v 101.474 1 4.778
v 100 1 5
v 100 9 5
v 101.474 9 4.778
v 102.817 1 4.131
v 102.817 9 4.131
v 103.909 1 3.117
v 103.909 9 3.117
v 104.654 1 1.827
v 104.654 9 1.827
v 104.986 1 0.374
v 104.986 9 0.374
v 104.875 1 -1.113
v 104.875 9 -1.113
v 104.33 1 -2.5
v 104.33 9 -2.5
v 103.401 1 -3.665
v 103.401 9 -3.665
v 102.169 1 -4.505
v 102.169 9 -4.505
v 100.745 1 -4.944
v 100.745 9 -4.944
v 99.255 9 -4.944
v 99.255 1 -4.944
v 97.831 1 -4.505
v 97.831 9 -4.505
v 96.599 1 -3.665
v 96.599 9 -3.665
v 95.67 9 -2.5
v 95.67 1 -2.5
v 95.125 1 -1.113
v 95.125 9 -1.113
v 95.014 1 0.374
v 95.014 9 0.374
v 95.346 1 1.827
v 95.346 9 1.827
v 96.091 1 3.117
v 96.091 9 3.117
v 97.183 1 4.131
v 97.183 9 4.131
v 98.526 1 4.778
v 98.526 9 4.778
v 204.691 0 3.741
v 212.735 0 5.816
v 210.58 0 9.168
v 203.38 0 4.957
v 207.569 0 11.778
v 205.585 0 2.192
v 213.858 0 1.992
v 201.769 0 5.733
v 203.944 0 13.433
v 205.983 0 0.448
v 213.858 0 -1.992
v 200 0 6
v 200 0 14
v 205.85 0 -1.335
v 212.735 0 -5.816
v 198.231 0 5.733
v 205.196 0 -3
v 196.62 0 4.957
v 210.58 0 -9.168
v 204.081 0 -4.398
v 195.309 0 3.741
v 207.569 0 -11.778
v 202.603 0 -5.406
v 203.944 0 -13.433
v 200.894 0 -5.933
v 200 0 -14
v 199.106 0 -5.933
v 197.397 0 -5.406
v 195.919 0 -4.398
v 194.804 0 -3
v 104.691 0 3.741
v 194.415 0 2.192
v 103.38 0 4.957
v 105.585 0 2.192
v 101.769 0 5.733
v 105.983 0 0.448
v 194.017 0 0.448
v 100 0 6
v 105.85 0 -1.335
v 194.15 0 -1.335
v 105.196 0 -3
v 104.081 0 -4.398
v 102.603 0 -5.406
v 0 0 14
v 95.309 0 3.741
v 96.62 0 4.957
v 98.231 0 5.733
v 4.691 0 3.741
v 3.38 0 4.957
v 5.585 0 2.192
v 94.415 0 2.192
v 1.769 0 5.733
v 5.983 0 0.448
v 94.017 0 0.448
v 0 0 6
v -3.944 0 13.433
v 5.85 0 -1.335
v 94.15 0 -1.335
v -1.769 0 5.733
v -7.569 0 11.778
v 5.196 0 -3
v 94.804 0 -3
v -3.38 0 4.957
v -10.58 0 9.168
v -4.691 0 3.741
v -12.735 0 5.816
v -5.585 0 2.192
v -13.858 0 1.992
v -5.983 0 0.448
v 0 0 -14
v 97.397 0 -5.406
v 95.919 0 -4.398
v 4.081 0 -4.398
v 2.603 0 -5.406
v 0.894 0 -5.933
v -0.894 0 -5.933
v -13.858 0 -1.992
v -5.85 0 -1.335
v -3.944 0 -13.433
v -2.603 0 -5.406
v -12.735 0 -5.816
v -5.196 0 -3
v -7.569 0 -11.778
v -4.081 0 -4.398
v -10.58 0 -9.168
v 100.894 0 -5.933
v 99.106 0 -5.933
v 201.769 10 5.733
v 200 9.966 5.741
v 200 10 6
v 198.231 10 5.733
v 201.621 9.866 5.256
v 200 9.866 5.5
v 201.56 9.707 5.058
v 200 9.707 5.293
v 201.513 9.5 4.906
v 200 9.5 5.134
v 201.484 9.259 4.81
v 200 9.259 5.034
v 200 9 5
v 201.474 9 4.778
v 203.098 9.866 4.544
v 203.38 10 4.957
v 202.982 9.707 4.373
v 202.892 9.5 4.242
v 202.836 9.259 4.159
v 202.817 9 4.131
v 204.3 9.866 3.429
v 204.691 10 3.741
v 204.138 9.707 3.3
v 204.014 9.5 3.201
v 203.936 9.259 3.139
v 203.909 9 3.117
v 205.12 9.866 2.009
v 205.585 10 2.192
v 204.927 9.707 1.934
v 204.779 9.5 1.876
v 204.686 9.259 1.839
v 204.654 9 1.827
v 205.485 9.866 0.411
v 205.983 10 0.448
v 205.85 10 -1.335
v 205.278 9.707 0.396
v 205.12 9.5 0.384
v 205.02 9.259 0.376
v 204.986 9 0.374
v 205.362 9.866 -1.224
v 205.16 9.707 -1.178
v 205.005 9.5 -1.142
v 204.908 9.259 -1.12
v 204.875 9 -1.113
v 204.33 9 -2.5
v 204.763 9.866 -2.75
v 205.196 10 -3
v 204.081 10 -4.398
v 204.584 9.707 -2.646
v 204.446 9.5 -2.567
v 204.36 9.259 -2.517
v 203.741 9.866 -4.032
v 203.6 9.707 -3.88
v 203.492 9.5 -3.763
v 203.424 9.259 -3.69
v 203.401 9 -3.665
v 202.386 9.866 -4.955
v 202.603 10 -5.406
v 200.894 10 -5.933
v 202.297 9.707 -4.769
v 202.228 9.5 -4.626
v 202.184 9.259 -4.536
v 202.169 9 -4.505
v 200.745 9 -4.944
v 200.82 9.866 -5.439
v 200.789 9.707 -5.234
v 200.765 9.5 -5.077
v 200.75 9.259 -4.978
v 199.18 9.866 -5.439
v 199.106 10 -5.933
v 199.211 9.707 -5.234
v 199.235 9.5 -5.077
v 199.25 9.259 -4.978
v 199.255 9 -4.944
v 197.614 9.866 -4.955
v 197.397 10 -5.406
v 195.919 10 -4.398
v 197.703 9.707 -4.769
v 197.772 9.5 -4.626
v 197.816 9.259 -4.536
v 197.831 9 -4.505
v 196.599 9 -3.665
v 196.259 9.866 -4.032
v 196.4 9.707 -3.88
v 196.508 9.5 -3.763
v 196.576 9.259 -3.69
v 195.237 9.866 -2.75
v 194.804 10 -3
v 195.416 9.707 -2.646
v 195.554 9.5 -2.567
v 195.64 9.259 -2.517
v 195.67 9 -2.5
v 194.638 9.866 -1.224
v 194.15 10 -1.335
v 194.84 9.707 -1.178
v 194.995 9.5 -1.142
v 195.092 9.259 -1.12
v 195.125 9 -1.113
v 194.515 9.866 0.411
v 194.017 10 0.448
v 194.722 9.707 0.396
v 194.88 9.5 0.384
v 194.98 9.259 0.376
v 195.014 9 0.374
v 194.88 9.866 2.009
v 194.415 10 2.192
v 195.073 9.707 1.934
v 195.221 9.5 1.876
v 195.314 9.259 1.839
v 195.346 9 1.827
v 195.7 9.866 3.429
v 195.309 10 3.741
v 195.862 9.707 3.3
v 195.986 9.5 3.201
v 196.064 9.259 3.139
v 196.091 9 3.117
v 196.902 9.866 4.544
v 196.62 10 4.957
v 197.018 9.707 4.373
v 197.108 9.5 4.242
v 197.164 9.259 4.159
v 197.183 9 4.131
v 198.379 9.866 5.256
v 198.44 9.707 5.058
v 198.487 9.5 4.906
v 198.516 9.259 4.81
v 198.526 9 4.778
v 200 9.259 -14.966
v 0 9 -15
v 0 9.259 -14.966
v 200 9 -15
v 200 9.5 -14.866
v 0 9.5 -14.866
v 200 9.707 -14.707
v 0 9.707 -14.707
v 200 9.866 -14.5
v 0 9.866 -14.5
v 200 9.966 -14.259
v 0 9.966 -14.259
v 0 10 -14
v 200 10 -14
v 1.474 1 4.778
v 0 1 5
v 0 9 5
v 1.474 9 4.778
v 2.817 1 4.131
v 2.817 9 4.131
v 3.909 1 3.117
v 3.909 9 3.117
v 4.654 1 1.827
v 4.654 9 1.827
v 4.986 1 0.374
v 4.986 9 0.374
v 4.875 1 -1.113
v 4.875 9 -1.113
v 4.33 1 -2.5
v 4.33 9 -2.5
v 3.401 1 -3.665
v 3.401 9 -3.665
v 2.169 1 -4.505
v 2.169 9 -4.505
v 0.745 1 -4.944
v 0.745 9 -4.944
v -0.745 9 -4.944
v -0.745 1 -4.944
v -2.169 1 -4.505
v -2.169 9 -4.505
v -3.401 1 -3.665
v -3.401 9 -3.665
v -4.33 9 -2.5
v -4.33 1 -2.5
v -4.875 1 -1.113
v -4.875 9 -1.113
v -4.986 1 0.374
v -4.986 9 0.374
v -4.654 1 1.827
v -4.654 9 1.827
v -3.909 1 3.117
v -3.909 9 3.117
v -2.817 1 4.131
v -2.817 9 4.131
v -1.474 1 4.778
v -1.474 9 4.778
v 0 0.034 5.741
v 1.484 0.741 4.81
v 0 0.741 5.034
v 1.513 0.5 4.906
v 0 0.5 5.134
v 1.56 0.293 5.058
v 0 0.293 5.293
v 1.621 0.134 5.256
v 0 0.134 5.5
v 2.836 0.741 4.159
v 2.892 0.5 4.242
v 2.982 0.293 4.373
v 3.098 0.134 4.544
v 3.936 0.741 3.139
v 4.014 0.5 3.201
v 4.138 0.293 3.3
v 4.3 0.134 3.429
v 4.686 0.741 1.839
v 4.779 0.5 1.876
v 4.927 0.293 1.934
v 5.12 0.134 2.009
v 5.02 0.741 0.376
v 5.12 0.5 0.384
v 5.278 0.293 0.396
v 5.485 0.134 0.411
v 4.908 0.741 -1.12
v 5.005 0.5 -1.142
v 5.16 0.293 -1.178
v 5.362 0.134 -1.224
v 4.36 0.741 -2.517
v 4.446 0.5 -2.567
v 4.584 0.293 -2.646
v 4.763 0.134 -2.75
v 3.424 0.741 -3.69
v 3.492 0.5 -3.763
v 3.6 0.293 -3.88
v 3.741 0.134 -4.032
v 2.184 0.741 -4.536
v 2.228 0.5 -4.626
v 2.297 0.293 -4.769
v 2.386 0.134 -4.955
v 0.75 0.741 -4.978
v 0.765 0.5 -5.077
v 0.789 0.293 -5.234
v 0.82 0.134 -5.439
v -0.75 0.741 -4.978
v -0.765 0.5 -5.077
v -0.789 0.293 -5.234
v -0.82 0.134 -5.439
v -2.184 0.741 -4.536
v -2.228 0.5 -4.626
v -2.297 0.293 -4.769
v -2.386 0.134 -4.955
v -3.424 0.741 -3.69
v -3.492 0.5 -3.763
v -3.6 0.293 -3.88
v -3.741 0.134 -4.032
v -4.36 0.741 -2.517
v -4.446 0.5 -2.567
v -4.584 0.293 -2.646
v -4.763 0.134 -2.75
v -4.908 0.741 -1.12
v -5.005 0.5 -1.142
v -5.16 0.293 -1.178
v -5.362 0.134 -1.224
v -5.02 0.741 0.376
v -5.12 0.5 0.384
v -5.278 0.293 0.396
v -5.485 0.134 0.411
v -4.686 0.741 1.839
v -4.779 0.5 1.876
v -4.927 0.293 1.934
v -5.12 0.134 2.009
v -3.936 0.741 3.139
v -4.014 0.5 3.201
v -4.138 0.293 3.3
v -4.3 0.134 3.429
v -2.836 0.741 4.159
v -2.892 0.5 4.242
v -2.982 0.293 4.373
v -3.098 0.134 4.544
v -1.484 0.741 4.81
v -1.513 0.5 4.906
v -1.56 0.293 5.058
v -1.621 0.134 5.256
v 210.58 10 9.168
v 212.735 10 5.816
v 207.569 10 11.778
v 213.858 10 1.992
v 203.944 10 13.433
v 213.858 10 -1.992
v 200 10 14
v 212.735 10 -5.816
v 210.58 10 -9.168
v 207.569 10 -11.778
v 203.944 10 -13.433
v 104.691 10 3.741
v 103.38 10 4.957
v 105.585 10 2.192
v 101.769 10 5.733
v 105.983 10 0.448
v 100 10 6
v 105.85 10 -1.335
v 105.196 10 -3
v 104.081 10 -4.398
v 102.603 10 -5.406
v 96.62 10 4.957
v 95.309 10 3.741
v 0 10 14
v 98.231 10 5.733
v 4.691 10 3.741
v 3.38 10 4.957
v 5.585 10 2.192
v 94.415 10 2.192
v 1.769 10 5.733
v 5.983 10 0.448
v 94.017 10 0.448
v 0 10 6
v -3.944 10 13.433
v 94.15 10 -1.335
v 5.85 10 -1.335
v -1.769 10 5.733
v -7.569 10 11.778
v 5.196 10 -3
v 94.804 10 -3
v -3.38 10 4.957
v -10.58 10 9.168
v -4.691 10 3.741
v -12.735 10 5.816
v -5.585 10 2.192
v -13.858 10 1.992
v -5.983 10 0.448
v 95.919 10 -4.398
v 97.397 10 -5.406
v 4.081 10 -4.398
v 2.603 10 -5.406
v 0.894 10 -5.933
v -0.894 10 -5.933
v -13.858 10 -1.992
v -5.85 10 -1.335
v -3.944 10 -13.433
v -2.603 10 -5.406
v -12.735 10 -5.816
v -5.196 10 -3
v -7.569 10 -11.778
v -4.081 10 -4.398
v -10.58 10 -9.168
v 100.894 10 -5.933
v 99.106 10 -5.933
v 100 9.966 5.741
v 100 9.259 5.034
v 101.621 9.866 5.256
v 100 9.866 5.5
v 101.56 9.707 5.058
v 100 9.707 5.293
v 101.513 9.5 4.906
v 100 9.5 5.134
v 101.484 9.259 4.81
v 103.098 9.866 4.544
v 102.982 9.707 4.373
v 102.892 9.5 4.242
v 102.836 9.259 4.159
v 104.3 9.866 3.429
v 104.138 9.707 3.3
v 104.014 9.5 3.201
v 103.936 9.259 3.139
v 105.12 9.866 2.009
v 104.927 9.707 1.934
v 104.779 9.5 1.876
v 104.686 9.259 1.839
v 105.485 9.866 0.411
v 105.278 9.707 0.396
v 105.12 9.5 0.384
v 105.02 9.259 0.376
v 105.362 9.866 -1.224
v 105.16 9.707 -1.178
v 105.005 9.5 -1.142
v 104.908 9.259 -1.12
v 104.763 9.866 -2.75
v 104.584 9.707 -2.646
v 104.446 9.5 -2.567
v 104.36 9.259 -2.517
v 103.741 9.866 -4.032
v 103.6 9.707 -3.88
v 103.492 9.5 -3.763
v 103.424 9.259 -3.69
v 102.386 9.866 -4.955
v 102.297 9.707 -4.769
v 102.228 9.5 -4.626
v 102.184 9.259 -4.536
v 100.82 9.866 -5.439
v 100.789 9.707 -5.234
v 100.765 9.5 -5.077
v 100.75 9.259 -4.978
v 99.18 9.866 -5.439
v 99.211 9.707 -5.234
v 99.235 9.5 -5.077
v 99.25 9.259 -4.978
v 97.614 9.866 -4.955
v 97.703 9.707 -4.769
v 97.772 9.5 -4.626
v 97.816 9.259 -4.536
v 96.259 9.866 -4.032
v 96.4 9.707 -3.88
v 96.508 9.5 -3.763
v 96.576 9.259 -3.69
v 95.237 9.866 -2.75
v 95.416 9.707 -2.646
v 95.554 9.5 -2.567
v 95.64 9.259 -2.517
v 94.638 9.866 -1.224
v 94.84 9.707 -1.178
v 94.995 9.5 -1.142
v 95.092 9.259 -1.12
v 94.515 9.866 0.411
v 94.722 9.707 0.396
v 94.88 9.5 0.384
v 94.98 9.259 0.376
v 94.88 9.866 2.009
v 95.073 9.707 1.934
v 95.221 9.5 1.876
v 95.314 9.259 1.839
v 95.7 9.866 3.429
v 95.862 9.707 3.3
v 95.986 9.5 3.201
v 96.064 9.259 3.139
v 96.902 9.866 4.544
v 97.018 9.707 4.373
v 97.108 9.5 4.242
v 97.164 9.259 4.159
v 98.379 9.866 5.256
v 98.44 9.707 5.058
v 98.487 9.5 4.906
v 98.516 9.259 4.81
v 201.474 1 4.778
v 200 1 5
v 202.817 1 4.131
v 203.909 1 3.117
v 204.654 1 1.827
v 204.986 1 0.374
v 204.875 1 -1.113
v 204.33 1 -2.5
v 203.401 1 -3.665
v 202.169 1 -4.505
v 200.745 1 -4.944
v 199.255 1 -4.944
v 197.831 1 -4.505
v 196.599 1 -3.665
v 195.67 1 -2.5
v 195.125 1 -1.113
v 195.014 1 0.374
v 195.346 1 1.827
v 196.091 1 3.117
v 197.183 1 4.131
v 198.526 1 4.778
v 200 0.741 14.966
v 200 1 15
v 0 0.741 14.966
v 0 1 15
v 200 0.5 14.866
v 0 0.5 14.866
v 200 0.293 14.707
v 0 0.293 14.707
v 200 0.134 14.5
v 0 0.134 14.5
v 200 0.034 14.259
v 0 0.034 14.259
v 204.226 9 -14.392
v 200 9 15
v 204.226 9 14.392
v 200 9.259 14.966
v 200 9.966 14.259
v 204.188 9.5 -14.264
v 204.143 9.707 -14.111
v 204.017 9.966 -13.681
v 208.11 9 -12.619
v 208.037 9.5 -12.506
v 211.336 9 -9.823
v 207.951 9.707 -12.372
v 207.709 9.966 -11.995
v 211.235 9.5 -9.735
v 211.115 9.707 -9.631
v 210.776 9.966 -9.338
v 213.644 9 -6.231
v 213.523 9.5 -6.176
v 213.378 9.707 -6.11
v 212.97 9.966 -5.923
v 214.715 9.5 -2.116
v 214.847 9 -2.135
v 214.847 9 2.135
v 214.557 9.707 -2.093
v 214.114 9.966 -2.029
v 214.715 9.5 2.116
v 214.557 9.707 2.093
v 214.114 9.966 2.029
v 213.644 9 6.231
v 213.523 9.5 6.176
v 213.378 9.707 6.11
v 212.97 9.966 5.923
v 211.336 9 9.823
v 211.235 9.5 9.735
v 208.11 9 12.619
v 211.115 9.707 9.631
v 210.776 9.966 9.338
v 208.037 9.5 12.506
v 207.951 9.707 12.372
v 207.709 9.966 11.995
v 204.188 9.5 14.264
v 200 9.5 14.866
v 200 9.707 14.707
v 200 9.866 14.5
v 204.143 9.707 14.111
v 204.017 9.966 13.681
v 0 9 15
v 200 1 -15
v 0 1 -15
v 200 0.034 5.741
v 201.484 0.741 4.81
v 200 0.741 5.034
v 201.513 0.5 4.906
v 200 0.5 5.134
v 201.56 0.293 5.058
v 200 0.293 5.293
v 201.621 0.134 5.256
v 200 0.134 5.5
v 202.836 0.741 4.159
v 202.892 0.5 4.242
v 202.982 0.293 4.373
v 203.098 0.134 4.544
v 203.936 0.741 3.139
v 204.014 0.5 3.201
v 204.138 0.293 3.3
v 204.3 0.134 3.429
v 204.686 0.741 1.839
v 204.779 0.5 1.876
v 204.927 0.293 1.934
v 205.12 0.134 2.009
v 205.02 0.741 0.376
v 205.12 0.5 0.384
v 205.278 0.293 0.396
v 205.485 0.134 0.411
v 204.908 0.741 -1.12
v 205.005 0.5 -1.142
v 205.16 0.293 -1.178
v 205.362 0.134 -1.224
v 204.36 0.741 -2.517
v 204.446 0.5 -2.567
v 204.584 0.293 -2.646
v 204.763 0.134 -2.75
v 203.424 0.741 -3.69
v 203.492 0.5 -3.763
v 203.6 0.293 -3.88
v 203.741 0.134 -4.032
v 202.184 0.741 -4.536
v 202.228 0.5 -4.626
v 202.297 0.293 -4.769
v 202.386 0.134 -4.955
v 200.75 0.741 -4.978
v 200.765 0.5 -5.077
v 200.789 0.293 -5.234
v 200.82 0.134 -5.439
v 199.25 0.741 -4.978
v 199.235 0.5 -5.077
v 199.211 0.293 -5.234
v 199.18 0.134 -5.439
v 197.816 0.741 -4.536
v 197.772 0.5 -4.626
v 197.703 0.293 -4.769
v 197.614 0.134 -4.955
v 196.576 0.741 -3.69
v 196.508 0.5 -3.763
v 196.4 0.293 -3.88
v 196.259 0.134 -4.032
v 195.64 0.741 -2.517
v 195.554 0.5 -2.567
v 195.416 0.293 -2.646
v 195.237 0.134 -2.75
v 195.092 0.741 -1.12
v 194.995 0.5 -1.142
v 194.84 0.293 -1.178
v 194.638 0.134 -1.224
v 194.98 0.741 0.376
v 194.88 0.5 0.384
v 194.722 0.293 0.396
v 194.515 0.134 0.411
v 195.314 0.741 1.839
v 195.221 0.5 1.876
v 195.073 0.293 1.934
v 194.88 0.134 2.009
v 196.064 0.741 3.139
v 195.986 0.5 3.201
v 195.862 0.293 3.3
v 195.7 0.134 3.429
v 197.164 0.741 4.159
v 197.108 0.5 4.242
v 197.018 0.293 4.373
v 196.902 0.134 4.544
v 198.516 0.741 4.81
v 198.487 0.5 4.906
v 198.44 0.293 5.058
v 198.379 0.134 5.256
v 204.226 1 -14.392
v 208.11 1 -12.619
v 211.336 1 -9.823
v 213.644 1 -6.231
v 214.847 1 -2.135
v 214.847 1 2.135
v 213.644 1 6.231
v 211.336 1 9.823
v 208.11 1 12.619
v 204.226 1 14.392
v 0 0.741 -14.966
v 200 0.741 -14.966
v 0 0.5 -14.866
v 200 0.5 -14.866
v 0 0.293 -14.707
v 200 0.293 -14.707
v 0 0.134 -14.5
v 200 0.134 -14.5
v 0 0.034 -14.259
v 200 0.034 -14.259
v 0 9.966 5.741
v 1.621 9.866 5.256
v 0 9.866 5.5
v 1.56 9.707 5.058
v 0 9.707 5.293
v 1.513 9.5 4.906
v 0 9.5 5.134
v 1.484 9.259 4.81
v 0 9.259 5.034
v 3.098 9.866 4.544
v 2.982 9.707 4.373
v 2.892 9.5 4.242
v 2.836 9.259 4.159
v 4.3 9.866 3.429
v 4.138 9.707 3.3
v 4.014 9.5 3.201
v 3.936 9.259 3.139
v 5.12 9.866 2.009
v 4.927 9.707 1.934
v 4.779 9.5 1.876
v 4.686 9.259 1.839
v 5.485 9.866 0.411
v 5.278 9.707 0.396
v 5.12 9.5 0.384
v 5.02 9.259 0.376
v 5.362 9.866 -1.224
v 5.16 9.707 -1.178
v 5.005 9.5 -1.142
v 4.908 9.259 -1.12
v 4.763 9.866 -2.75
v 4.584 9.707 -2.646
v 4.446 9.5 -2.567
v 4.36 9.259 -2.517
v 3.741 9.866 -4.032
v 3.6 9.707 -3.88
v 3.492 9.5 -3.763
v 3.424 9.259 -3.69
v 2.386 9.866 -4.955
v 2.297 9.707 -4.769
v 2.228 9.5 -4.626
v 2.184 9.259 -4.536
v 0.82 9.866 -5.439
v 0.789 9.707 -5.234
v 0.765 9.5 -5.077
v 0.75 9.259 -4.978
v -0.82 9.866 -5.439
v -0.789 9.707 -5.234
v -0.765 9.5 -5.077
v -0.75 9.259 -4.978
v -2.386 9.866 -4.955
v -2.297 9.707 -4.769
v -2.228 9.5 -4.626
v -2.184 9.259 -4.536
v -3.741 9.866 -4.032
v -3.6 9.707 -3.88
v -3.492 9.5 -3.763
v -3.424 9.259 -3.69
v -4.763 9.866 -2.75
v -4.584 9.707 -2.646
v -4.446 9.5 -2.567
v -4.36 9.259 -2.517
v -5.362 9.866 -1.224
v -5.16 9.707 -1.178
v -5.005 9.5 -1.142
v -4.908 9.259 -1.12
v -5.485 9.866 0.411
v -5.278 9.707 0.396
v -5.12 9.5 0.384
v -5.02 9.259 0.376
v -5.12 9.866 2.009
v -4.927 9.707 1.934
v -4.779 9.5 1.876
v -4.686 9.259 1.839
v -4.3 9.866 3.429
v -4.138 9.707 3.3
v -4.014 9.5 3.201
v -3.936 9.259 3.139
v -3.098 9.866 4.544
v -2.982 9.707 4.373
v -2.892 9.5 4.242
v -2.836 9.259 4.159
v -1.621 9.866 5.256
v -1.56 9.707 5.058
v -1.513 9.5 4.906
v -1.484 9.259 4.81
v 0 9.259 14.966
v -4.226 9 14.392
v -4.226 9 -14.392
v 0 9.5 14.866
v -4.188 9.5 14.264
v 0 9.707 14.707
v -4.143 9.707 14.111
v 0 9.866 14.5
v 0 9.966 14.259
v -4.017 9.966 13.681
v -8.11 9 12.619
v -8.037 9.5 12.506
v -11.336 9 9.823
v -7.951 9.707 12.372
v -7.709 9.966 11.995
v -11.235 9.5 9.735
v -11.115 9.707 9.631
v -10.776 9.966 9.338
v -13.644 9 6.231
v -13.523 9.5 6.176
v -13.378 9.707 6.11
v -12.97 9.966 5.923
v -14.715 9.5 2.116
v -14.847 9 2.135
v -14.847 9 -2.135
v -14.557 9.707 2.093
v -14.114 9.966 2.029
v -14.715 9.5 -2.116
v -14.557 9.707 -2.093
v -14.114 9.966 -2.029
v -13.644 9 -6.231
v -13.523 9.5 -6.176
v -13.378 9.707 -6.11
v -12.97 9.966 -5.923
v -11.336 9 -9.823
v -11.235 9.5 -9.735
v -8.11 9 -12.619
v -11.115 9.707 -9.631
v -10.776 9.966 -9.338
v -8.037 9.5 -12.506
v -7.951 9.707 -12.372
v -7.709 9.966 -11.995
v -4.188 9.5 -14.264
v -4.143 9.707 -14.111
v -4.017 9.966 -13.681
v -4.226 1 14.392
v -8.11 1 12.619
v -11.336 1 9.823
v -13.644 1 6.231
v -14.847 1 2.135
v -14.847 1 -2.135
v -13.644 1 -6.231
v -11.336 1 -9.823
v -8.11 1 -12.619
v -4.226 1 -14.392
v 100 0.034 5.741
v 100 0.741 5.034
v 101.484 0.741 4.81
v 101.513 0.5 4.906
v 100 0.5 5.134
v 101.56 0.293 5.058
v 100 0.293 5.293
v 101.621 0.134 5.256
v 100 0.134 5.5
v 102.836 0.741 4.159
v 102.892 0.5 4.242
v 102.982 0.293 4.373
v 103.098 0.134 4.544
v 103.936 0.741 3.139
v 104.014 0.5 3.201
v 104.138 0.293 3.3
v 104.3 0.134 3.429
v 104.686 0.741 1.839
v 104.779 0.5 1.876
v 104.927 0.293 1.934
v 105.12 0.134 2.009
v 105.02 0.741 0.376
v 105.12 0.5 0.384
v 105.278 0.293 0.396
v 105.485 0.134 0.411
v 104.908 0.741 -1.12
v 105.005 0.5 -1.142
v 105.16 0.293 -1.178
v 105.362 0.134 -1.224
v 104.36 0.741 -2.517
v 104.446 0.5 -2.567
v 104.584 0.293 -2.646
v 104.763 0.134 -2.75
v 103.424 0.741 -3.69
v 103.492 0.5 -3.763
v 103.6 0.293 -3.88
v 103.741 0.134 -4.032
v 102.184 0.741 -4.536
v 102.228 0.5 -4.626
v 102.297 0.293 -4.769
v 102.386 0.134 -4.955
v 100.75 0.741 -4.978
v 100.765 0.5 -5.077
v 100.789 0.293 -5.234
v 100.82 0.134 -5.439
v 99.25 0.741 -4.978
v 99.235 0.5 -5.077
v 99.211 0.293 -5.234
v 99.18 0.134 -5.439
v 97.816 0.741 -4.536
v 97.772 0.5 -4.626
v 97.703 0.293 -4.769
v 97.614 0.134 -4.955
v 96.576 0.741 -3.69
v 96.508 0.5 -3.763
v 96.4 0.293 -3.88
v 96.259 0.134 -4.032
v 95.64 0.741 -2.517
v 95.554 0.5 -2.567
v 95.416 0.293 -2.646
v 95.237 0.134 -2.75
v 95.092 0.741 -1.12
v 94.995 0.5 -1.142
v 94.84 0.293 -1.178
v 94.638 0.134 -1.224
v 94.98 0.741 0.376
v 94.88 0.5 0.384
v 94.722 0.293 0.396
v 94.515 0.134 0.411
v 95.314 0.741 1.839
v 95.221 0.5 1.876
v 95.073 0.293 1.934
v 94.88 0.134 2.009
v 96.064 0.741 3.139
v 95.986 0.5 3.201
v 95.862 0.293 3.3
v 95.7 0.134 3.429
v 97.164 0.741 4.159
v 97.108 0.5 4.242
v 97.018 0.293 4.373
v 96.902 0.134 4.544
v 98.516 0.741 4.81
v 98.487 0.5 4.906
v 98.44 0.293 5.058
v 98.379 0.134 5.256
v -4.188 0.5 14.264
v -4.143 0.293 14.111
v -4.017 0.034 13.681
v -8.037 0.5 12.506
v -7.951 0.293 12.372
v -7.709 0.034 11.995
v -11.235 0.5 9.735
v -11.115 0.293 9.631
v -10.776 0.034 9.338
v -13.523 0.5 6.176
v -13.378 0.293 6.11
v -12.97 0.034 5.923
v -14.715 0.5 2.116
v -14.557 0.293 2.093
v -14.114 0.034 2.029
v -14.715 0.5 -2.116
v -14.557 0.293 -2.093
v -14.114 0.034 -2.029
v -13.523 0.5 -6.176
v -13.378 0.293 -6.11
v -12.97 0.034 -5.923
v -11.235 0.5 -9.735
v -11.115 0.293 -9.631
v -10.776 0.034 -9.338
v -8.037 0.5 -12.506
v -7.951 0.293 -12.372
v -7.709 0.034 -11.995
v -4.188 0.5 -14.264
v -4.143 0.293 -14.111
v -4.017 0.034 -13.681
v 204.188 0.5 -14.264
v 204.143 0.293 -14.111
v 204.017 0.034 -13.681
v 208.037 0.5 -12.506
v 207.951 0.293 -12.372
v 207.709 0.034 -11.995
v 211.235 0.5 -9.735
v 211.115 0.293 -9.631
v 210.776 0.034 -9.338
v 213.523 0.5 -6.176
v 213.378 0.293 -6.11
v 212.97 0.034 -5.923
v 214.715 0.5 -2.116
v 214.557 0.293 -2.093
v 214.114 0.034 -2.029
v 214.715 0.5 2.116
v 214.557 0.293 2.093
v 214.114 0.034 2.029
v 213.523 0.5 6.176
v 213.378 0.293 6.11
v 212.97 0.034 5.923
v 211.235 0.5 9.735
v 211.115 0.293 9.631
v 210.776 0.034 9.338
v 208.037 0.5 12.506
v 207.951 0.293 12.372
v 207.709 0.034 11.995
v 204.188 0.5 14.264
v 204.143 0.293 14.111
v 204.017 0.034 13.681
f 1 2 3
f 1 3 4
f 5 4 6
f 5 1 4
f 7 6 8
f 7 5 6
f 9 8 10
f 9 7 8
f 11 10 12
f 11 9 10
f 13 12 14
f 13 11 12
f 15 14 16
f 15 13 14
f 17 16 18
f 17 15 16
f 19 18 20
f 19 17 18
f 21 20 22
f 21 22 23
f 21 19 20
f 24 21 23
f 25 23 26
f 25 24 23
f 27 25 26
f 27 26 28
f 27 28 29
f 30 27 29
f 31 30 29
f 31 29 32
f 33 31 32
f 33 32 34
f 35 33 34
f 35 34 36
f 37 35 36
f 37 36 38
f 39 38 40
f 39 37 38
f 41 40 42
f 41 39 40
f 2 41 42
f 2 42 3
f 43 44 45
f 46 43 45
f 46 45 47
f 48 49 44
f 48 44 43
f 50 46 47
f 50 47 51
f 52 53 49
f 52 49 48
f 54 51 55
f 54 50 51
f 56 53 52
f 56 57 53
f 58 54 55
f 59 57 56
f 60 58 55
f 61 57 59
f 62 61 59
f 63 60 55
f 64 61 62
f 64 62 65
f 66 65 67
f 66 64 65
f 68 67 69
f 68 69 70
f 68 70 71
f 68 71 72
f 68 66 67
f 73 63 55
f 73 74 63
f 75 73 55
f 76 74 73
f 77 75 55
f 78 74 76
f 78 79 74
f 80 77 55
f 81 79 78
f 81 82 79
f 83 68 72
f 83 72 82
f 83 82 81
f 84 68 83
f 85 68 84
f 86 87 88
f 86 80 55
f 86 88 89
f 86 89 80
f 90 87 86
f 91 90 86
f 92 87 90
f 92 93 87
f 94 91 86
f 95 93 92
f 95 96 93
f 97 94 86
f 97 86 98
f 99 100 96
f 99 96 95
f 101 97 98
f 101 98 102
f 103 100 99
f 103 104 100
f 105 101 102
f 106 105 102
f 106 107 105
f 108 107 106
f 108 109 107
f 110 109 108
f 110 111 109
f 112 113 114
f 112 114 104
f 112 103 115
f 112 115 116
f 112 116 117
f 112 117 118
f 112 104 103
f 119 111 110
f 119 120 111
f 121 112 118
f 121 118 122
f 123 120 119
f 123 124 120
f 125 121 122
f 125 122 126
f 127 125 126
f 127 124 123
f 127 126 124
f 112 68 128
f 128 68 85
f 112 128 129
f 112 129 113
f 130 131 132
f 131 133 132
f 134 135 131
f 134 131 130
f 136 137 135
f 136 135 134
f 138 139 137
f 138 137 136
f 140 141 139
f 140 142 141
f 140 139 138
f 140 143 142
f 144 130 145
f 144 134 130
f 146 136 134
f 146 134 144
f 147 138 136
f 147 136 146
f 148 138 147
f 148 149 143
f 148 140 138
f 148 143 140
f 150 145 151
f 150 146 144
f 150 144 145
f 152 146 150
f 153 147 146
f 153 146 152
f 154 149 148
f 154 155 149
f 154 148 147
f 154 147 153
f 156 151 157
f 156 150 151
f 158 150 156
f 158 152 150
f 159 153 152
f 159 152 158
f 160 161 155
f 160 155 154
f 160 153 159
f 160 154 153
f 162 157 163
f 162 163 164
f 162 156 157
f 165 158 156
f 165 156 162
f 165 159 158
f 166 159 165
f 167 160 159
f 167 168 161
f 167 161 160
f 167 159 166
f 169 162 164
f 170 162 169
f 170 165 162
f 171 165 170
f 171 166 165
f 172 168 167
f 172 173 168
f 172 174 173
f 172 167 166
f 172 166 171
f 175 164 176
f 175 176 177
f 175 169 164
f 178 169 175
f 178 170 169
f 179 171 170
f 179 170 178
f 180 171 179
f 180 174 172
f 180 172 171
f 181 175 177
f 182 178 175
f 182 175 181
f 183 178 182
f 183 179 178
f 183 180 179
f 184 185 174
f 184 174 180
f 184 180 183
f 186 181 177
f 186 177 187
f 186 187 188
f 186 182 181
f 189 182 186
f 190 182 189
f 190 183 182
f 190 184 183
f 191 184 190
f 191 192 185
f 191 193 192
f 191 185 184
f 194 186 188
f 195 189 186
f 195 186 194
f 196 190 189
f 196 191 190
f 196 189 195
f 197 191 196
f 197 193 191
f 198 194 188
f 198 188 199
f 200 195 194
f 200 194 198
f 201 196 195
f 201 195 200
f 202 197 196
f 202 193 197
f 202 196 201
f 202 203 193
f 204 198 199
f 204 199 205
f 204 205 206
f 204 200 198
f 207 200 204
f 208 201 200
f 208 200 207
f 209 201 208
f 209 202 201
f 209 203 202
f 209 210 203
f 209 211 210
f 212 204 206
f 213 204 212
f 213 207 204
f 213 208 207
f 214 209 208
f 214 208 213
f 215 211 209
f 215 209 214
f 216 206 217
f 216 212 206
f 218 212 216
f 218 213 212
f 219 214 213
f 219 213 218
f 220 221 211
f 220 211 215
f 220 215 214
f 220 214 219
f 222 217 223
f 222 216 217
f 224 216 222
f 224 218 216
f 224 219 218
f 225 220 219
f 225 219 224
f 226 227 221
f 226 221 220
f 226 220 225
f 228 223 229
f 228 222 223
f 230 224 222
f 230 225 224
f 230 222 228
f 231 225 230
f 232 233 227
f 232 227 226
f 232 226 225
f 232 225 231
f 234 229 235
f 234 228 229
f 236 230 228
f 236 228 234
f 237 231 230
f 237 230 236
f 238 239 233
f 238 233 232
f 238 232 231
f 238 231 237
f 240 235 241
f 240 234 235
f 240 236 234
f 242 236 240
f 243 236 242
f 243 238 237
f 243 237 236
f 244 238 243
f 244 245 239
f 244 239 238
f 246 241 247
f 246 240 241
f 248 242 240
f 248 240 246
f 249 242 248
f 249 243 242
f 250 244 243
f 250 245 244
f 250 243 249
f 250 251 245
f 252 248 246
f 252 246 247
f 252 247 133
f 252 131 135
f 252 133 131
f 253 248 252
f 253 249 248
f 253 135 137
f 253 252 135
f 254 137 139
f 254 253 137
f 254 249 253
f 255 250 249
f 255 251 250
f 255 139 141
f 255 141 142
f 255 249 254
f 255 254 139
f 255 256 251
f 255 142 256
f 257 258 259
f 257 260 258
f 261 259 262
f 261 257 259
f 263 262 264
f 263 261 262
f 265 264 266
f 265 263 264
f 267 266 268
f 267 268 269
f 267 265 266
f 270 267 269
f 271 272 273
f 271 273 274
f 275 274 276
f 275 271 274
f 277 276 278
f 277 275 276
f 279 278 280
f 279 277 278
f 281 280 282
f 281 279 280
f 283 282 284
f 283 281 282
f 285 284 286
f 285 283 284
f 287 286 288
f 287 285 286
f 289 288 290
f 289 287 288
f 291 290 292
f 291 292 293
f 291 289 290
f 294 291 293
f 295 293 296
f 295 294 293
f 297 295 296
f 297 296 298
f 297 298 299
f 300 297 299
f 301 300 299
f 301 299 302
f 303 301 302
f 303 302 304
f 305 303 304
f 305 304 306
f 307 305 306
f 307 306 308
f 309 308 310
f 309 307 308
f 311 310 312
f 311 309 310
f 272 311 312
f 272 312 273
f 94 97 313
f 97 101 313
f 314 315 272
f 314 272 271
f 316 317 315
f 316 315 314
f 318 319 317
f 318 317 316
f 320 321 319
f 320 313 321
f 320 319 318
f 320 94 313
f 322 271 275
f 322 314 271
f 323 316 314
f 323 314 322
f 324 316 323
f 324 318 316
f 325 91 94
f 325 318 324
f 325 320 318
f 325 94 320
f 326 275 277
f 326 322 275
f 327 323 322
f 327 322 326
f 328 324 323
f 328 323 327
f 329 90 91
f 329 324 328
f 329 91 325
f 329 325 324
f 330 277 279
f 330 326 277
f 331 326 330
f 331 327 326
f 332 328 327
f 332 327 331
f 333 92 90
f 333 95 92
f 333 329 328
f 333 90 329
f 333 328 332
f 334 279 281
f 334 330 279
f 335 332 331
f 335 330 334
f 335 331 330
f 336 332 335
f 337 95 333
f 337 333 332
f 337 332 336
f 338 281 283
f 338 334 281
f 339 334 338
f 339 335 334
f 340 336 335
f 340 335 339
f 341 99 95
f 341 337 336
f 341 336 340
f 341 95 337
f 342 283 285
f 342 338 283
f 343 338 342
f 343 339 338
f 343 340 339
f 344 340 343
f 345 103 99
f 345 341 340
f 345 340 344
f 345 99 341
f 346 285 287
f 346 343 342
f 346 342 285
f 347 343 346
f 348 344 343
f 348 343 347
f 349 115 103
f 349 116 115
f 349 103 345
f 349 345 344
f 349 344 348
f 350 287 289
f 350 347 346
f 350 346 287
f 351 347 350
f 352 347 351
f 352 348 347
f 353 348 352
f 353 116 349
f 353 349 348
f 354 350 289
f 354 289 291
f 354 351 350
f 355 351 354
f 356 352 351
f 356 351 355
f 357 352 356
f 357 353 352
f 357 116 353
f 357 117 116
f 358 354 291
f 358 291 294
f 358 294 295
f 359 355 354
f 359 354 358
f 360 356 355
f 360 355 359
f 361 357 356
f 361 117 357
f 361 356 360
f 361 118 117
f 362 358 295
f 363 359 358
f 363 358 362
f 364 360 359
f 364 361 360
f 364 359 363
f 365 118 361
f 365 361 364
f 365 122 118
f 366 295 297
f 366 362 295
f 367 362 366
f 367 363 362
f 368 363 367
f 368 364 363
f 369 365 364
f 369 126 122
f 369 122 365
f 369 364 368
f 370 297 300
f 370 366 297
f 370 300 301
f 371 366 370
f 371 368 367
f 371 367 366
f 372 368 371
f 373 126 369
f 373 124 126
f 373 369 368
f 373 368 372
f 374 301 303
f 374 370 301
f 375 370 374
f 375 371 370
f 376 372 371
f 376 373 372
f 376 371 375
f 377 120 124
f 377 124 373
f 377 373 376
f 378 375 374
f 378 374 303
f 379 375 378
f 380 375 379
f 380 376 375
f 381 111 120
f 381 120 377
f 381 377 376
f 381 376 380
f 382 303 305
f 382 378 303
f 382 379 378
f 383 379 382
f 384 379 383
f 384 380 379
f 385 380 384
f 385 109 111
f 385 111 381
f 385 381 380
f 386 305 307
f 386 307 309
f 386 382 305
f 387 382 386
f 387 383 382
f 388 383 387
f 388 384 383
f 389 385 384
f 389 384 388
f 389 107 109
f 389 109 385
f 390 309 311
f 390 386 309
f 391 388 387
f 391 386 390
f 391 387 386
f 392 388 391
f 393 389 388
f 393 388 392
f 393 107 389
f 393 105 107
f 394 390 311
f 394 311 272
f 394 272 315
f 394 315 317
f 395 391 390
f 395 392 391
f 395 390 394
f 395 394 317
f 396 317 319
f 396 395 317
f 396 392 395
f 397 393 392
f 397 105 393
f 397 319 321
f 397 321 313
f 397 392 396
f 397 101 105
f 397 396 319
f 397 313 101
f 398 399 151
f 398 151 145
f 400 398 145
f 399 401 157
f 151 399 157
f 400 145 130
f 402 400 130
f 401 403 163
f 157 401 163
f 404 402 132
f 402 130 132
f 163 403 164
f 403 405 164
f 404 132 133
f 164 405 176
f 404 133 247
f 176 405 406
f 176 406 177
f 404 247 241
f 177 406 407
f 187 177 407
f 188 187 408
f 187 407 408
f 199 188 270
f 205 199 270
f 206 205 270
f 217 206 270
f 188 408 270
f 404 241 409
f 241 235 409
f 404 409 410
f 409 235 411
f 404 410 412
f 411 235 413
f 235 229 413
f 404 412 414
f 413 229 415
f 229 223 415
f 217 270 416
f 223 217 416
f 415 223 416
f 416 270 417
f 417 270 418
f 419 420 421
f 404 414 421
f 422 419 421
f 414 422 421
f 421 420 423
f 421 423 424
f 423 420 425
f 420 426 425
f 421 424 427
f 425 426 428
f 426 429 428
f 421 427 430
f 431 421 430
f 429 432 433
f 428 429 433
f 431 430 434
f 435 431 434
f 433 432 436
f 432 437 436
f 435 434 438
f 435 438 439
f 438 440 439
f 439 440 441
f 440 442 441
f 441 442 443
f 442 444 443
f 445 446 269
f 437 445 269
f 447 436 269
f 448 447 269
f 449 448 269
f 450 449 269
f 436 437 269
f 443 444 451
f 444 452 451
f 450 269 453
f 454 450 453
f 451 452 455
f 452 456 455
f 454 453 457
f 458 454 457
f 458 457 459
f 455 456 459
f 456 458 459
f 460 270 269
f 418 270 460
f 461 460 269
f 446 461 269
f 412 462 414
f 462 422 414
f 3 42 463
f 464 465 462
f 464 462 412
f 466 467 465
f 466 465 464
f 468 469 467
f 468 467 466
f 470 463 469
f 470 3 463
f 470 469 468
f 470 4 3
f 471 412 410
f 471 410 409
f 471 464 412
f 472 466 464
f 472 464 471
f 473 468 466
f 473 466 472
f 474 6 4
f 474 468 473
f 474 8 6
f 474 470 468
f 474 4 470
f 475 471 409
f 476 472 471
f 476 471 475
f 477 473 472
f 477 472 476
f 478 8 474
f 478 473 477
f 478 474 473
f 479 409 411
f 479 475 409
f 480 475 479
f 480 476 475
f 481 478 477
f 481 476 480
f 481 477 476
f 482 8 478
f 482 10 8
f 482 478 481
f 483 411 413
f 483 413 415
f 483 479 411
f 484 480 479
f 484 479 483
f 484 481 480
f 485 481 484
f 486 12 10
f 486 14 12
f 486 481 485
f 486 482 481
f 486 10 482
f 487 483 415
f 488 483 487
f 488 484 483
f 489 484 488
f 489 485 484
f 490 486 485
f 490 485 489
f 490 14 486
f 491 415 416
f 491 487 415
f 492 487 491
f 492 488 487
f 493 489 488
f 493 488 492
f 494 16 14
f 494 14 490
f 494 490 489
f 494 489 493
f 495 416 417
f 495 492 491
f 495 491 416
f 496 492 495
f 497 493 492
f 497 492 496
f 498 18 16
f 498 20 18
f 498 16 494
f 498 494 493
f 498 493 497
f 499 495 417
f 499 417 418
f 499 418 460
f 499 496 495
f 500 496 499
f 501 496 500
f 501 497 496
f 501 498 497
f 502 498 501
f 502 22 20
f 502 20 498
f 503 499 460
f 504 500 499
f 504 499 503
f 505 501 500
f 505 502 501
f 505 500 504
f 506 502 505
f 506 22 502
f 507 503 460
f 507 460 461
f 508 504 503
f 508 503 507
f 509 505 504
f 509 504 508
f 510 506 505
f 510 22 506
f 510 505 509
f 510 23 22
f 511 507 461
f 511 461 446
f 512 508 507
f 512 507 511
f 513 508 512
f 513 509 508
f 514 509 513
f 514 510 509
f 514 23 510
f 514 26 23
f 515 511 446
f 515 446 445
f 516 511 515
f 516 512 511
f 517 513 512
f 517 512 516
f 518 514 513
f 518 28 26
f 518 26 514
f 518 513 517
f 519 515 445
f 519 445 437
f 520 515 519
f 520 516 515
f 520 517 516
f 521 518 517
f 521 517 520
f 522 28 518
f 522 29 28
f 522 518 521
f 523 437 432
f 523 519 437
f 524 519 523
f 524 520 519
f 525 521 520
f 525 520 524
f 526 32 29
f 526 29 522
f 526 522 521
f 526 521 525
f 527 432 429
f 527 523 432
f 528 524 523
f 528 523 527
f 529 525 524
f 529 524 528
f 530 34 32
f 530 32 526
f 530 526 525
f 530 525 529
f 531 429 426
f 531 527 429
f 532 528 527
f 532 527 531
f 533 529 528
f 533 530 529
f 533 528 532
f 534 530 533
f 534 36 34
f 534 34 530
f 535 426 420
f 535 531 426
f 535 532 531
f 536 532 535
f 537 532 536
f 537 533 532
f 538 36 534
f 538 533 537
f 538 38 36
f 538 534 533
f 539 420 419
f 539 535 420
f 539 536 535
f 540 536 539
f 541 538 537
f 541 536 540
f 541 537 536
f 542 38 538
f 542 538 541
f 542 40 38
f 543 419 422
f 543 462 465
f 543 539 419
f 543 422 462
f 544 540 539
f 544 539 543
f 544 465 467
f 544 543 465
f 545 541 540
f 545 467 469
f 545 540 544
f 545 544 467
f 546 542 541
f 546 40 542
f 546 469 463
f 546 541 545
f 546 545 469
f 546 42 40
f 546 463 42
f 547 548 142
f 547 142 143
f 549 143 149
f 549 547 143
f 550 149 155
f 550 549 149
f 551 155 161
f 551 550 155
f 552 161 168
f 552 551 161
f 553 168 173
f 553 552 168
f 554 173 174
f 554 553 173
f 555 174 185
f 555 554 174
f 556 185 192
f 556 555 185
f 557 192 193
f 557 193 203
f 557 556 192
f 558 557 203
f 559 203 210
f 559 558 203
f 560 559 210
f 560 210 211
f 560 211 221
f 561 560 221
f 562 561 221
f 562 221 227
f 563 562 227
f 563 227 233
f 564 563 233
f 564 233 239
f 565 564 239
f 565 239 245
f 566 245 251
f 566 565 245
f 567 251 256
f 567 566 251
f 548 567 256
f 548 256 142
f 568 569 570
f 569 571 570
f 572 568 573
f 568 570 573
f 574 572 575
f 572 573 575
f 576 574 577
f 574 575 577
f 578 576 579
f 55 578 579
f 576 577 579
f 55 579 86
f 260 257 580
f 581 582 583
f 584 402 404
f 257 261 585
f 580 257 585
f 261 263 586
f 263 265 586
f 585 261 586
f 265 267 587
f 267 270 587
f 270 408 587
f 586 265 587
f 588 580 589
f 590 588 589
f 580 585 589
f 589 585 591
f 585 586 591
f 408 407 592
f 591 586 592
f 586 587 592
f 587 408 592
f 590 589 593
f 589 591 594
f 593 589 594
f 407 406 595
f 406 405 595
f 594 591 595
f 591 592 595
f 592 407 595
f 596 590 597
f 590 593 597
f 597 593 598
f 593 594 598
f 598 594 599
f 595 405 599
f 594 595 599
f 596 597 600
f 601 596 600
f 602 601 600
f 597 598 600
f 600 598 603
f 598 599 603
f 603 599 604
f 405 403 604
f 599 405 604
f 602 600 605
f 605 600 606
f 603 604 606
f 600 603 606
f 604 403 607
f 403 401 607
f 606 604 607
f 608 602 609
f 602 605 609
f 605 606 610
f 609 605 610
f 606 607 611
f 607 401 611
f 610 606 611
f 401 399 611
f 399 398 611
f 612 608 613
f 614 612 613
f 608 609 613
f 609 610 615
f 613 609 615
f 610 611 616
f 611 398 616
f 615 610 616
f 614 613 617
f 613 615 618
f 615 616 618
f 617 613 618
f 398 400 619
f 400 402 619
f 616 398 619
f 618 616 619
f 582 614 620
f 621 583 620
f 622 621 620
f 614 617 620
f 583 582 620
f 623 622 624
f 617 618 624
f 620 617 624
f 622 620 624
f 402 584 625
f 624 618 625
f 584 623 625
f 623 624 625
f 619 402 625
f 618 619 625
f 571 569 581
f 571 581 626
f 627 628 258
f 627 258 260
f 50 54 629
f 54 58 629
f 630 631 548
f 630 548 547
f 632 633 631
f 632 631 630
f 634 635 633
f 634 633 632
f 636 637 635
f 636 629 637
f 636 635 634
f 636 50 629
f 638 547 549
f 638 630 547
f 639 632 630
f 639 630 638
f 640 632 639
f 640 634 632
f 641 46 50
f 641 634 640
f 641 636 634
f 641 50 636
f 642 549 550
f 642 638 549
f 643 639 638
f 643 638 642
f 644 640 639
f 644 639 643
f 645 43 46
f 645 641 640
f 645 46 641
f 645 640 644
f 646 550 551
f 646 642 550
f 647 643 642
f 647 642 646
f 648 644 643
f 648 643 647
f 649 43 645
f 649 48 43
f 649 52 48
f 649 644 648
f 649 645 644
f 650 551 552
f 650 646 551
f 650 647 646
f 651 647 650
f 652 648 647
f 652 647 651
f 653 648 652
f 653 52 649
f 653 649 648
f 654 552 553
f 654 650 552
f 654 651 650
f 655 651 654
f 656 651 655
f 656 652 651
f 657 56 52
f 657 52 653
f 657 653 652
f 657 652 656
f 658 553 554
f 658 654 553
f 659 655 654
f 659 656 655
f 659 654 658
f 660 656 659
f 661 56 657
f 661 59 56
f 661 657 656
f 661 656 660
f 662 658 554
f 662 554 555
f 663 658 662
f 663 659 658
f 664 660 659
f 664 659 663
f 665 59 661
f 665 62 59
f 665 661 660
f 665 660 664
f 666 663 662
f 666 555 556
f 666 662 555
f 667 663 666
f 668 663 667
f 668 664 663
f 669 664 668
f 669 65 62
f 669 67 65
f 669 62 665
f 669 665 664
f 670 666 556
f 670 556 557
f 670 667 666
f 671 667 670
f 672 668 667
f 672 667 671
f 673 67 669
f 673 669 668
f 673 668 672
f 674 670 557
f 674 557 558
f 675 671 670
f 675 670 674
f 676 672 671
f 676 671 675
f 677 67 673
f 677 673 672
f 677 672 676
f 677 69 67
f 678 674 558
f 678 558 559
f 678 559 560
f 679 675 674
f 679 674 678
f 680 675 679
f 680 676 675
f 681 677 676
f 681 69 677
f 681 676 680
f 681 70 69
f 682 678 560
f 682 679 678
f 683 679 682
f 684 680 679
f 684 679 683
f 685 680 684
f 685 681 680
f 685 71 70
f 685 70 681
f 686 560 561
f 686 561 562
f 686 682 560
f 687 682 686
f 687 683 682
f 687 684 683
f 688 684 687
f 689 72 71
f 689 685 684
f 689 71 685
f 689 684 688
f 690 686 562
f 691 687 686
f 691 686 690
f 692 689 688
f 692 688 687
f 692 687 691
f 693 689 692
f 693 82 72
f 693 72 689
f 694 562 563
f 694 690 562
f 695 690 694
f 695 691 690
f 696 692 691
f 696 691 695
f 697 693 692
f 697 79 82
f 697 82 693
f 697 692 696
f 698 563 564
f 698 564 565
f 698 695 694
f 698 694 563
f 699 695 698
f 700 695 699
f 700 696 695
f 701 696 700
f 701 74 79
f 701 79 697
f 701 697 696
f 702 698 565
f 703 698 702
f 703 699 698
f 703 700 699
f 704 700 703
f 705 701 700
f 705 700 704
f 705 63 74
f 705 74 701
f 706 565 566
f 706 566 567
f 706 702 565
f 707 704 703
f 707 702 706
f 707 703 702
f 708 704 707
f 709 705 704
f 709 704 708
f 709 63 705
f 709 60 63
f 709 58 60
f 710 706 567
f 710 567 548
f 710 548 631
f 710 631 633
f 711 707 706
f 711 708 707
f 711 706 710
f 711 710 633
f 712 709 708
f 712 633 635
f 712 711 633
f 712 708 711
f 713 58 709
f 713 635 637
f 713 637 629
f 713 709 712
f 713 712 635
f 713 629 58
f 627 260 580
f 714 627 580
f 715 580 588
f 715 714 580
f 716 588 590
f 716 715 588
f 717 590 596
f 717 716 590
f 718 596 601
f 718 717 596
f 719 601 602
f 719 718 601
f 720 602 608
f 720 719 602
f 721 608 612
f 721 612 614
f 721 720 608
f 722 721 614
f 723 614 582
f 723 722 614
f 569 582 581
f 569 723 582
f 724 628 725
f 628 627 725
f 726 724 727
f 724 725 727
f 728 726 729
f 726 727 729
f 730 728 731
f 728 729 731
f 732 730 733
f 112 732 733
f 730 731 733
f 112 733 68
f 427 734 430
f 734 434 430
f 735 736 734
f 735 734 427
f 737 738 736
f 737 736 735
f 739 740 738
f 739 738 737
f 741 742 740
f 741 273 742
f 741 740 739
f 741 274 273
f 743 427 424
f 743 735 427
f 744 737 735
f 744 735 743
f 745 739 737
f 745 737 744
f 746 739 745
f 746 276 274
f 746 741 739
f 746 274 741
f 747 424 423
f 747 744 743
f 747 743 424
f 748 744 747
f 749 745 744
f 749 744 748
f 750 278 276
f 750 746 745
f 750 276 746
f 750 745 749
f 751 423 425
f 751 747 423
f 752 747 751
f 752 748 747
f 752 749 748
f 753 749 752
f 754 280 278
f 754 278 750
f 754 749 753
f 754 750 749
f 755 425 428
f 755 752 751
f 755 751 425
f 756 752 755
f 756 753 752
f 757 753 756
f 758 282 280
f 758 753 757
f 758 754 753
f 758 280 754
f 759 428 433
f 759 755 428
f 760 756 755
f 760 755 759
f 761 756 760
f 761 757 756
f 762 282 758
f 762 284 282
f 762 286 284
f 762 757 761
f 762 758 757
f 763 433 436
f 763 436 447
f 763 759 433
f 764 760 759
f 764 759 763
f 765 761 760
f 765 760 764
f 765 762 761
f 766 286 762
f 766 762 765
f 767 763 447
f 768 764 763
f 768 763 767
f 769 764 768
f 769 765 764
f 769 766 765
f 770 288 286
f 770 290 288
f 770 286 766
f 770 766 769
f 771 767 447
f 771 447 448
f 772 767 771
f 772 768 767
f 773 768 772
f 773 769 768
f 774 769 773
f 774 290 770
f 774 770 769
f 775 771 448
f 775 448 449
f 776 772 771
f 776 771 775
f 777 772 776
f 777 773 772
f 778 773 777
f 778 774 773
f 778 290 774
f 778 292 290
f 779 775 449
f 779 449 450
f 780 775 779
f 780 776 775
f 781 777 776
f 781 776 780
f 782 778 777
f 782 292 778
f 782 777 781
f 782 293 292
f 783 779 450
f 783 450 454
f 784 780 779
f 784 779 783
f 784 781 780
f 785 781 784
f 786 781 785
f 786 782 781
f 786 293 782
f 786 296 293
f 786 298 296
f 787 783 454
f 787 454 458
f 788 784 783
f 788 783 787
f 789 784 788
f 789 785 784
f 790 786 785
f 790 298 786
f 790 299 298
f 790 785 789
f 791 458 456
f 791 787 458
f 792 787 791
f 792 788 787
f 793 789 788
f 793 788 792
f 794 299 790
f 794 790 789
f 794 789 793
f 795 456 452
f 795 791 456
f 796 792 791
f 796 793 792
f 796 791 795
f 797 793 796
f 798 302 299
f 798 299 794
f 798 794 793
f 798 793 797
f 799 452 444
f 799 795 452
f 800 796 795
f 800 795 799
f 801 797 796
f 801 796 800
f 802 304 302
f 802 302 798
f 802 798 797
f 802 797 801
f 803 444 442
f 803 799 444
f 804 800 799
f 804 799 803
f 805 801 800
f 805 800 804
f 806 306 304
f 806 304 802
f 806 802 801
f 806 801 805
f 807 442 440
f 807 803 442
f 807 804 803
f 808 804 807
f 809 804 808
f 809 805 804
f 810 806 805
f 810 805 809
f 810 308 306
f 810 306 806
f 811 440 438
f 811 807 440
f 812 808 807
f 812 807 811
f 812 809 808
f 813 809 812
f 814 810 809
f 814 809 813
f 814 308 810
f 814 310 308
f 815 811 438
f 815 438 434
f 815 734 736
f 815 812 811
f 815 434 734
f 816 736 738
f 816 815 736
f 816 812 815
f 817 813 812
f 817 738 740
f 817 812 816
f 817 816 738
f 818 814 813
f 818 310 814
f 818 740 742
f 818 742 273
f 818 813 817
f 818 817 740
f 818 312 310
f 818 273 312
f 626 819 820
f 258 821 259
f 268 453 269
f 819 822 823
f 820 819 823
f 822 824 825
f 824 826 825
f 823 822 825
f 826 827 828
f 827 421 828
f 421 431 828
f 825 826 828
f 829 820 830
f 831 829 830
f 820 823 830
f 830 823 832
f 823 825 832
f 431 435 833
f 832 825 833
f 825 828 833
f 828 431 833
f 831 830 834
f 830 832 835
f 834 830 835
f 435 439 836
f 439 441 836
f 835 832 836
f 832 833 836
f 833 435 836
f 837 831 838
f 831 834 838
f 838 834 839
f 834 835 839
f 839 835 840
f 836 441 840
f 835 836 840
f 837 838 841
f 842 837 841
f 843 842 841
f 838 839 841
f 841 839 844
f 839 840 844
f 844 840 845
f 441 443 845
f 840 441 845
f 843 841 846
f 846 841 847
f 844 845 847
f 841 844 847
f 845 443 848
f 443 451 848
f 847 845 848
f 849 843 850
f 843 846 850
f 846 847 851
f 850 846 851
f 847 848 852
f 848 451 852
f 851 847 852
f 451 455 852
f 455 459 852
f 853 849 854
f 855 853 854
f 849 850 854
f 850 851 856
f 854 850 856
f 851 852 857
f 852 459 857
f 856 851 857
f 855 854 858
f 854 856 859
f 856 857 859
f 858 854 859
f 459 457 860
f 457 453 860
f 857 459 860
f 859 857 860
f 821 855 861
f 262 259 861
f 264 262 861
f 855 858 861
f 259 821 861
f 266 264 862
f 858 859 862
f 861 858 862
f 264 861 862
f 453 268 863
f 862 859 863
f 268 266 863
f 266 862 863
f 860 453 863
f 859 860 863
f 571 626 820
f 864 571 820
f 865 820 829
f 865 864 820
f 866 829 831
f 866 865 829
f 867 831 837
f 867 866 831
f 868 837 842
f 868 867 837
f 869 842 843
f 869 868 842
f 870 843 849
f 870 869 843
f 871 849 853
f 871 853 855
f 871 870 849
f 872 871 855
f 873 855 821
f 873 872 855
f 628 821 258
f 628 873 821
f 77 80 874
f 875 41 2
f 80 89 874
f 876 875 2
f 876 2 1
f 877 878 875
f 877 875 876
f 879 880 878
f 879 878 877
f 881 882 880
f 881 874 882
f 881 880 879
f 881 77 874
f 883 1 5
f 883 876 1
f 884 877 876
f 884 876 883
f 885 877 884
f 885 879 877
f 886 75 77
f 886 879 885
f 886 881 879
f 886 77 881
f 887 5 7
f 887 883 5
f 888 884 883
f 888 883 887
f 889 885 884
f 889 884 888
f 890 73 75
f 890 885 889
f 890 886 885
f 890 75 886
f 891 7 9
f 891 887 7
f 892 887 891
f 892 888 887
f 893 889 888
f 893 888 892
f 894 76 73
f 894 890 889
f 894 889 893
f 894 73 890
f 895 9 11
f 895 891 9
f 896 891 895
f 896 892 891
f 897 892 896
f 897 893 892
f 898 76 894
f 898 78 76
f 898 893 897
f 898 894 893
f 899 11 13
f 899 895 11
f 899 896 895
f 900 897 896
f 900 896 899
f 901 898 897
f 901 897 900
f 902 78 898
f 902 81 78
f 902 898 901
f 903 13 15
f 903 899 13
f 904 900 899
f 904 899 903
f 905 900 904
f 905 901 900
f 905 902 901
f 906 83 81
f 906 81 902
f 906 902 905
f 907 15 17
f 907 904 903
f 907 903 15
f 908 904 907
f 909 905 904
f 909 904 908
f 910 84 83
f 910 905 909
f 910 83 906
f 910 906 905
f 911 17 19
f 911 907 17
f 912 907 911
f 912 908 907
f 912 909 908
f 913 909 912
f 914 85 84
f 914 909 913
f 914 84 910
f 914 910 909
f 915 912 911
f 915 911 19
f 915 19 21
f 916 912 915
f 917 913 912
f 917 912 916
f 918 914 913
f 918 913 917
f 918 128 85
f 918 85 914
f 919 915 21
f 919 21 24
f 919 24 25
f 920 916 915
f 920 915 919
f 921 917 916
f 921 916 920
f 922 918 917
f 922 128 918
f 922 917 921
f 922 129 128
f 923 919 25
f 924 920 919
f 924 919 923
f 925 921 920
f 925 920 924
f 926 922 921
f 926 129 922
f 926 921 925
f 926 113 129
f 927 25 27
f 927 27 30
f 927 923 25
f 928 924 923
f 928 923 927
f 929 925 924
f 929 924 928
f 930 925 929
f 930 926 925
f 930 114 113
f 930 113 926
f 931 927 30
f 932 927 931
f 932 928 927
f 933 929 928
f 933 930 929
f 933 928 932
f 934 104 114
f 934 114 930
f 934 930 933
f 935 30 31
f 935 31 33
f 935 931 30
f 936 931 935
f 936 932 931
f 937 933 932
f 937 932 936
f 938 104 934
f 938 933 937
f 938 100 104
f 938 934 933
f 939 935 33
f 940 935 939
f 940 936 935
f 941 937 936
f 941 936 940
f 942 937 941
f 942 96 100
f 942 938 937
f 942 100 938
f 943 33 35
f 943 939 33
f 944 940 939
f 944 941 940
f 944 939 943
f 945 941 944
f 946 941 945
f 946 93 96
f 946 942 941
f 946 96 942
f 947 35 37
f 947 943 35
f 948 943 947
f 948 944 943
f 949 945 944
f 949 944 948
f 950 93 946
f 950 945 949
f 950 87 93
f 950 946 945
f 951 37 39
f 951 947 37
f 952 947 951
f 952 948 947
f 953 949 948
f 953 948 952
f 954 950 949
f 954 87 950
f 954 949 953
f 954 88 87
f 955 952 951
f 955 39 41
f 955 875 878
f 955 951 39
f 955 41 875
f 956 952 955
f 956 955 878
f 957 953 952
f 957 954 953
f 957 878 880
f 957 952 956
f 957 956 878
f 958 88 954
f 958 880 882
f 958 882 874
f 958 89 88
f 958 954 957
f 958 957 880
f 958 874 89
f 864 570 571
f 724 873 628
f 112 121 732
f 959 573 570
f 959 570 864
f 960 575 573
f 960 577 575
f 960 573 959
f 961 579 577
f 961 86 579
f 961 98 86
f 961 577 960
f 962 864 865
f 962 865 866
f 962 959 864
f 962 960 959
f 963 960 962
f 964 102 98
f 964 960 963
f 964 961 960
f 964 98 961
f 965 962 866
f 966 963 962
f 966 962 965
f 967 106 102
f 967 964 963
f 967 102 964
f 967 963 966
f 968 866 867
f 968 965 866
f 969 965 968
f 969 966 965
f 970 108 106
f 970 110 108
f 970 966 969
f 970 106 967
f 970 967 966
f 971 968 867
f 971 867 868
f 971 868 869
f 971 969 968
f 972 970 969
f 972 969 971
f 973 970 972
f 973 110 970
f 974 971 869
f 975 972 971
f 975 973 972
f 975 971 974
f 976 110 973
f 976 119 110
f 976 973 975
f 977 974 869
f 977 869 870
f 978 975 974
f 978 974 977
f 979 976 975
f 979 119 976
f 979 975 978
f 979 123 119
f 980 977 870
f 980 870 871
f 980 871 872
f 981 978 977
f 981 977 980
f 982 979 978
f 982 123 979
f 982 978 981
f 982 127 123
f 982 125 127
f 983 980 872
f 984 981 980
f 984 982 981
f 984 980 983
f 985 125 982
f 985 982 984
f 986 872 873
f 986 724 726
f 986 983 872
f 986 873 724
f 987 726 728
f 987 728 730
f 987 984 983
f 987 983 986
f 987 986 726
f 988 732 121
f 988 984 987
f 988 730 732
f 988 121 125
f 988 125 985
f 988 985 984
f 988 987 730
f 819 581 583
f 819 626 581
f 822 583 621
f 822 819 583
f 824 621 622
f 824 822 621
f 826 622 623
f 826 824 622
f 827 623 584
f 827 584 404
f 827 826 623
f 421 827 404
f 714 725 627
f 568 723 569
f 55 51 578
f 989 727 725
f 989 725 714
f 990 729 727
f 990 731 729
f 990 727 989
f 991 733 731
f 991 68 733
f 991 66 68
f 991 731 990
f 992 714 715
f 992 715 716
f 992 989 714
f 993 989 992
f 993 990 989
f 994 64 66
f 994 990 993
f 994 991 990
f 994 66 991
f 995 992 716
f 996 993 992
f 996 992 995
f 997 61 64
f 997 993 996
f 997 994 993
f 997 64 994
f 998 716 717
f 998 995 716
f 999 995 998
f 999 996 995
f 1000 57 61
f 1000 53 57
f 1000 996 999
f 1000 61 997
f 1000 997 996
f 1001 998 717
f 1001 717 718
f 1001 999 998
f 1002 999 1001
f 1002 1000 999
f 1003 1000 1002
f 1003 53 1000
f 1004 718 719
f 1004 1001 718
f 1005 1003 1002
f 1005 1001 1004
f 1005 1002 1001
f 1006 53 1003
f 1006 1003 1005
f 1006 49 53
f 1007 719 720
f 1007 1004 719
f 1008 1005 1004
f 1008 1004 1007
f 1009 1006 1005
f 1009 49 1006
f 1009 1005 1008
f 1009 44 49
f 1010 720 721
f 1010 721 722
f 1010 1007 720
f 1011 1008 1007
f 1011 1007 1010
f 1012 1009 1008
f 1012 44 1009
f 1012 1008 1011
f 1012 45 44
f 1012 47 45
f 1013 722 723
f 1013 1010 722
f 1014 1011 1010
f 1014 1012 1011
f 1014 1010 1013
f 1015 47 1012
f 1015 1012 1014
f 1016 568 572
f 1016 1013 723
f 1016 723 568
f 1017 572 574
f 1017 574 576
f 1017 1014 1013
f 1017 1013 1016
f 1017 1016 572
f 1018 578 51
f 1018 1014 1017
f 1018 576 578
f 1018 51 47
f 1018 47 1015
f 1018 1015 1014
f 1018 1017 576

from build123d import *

# Parameters (mm, degrees)
SKETCH_1_R      = 5
EXTRUDE_1_DEPTH = 10
FILLET_1_R      = 1
FILLET_2_R      = 1


with BuildPart() as part:
    # 草图1 → 凸台-拉伸1 (new body)
    with BuildSketch(Plane(origin=(0, 0, 0), x_dir=(1, 0, 0), z_dir=(0, 1, 0))):
        with BuildLine():
            Line((0, 15), (200, 15))
            ThreePointArc((200, 15), (215, 0), (200, -15))
            Line((200, -15), (0, -15))
            ThreePointArc((0, -15), (-15, 0), (0, 15))
        make_face()
        with Locations(Location((200, 0, 0), (0, 0, 270))):
            Circle(SKETCH_1_R, mode=Mode.SUBTRACT)
        with Locations(Location((100, 0, 0), (0, 0, 270))):
            Circle(SKETCH_1_R, mode=Mode.SUBTRACT)
        with Locations(Location((0, 0, 0), (0, 0, 270))):
            Circle(SKETCH_1_R, mode=Mode.SUBTRACT)
    extrude(amount=EXTRUDE_1_DEPTH)

    # 圆角1
    fillet_1_edges = [part.edges().sort_by_distance(p)[0] for p in [
        (200, 0, -5),
        (215, 10, 0),
        (100, 0, -5),
        (100, 10, -15),
        (0, 0, -5),
        (-15, 10, 0),
        (100, 0, -15),
        (215, 0, 0),
        (100, 0, 15),
        (-15, 0, 0),
        (100, 10, 15),
    ]]
    fillet(fillet_1_edges, radius=FILLET_1_R)

    # 圆角2
    fillet_2_edges = [part.edges().sort_by_distance(p)[0] for p in [
        (200, 10, -5),
        (100, 10, -5),
        (0, 10, -5),
    ]]
    fillet(fillet_2_edges, radius=FILLET_2_R)


solid = part.part
